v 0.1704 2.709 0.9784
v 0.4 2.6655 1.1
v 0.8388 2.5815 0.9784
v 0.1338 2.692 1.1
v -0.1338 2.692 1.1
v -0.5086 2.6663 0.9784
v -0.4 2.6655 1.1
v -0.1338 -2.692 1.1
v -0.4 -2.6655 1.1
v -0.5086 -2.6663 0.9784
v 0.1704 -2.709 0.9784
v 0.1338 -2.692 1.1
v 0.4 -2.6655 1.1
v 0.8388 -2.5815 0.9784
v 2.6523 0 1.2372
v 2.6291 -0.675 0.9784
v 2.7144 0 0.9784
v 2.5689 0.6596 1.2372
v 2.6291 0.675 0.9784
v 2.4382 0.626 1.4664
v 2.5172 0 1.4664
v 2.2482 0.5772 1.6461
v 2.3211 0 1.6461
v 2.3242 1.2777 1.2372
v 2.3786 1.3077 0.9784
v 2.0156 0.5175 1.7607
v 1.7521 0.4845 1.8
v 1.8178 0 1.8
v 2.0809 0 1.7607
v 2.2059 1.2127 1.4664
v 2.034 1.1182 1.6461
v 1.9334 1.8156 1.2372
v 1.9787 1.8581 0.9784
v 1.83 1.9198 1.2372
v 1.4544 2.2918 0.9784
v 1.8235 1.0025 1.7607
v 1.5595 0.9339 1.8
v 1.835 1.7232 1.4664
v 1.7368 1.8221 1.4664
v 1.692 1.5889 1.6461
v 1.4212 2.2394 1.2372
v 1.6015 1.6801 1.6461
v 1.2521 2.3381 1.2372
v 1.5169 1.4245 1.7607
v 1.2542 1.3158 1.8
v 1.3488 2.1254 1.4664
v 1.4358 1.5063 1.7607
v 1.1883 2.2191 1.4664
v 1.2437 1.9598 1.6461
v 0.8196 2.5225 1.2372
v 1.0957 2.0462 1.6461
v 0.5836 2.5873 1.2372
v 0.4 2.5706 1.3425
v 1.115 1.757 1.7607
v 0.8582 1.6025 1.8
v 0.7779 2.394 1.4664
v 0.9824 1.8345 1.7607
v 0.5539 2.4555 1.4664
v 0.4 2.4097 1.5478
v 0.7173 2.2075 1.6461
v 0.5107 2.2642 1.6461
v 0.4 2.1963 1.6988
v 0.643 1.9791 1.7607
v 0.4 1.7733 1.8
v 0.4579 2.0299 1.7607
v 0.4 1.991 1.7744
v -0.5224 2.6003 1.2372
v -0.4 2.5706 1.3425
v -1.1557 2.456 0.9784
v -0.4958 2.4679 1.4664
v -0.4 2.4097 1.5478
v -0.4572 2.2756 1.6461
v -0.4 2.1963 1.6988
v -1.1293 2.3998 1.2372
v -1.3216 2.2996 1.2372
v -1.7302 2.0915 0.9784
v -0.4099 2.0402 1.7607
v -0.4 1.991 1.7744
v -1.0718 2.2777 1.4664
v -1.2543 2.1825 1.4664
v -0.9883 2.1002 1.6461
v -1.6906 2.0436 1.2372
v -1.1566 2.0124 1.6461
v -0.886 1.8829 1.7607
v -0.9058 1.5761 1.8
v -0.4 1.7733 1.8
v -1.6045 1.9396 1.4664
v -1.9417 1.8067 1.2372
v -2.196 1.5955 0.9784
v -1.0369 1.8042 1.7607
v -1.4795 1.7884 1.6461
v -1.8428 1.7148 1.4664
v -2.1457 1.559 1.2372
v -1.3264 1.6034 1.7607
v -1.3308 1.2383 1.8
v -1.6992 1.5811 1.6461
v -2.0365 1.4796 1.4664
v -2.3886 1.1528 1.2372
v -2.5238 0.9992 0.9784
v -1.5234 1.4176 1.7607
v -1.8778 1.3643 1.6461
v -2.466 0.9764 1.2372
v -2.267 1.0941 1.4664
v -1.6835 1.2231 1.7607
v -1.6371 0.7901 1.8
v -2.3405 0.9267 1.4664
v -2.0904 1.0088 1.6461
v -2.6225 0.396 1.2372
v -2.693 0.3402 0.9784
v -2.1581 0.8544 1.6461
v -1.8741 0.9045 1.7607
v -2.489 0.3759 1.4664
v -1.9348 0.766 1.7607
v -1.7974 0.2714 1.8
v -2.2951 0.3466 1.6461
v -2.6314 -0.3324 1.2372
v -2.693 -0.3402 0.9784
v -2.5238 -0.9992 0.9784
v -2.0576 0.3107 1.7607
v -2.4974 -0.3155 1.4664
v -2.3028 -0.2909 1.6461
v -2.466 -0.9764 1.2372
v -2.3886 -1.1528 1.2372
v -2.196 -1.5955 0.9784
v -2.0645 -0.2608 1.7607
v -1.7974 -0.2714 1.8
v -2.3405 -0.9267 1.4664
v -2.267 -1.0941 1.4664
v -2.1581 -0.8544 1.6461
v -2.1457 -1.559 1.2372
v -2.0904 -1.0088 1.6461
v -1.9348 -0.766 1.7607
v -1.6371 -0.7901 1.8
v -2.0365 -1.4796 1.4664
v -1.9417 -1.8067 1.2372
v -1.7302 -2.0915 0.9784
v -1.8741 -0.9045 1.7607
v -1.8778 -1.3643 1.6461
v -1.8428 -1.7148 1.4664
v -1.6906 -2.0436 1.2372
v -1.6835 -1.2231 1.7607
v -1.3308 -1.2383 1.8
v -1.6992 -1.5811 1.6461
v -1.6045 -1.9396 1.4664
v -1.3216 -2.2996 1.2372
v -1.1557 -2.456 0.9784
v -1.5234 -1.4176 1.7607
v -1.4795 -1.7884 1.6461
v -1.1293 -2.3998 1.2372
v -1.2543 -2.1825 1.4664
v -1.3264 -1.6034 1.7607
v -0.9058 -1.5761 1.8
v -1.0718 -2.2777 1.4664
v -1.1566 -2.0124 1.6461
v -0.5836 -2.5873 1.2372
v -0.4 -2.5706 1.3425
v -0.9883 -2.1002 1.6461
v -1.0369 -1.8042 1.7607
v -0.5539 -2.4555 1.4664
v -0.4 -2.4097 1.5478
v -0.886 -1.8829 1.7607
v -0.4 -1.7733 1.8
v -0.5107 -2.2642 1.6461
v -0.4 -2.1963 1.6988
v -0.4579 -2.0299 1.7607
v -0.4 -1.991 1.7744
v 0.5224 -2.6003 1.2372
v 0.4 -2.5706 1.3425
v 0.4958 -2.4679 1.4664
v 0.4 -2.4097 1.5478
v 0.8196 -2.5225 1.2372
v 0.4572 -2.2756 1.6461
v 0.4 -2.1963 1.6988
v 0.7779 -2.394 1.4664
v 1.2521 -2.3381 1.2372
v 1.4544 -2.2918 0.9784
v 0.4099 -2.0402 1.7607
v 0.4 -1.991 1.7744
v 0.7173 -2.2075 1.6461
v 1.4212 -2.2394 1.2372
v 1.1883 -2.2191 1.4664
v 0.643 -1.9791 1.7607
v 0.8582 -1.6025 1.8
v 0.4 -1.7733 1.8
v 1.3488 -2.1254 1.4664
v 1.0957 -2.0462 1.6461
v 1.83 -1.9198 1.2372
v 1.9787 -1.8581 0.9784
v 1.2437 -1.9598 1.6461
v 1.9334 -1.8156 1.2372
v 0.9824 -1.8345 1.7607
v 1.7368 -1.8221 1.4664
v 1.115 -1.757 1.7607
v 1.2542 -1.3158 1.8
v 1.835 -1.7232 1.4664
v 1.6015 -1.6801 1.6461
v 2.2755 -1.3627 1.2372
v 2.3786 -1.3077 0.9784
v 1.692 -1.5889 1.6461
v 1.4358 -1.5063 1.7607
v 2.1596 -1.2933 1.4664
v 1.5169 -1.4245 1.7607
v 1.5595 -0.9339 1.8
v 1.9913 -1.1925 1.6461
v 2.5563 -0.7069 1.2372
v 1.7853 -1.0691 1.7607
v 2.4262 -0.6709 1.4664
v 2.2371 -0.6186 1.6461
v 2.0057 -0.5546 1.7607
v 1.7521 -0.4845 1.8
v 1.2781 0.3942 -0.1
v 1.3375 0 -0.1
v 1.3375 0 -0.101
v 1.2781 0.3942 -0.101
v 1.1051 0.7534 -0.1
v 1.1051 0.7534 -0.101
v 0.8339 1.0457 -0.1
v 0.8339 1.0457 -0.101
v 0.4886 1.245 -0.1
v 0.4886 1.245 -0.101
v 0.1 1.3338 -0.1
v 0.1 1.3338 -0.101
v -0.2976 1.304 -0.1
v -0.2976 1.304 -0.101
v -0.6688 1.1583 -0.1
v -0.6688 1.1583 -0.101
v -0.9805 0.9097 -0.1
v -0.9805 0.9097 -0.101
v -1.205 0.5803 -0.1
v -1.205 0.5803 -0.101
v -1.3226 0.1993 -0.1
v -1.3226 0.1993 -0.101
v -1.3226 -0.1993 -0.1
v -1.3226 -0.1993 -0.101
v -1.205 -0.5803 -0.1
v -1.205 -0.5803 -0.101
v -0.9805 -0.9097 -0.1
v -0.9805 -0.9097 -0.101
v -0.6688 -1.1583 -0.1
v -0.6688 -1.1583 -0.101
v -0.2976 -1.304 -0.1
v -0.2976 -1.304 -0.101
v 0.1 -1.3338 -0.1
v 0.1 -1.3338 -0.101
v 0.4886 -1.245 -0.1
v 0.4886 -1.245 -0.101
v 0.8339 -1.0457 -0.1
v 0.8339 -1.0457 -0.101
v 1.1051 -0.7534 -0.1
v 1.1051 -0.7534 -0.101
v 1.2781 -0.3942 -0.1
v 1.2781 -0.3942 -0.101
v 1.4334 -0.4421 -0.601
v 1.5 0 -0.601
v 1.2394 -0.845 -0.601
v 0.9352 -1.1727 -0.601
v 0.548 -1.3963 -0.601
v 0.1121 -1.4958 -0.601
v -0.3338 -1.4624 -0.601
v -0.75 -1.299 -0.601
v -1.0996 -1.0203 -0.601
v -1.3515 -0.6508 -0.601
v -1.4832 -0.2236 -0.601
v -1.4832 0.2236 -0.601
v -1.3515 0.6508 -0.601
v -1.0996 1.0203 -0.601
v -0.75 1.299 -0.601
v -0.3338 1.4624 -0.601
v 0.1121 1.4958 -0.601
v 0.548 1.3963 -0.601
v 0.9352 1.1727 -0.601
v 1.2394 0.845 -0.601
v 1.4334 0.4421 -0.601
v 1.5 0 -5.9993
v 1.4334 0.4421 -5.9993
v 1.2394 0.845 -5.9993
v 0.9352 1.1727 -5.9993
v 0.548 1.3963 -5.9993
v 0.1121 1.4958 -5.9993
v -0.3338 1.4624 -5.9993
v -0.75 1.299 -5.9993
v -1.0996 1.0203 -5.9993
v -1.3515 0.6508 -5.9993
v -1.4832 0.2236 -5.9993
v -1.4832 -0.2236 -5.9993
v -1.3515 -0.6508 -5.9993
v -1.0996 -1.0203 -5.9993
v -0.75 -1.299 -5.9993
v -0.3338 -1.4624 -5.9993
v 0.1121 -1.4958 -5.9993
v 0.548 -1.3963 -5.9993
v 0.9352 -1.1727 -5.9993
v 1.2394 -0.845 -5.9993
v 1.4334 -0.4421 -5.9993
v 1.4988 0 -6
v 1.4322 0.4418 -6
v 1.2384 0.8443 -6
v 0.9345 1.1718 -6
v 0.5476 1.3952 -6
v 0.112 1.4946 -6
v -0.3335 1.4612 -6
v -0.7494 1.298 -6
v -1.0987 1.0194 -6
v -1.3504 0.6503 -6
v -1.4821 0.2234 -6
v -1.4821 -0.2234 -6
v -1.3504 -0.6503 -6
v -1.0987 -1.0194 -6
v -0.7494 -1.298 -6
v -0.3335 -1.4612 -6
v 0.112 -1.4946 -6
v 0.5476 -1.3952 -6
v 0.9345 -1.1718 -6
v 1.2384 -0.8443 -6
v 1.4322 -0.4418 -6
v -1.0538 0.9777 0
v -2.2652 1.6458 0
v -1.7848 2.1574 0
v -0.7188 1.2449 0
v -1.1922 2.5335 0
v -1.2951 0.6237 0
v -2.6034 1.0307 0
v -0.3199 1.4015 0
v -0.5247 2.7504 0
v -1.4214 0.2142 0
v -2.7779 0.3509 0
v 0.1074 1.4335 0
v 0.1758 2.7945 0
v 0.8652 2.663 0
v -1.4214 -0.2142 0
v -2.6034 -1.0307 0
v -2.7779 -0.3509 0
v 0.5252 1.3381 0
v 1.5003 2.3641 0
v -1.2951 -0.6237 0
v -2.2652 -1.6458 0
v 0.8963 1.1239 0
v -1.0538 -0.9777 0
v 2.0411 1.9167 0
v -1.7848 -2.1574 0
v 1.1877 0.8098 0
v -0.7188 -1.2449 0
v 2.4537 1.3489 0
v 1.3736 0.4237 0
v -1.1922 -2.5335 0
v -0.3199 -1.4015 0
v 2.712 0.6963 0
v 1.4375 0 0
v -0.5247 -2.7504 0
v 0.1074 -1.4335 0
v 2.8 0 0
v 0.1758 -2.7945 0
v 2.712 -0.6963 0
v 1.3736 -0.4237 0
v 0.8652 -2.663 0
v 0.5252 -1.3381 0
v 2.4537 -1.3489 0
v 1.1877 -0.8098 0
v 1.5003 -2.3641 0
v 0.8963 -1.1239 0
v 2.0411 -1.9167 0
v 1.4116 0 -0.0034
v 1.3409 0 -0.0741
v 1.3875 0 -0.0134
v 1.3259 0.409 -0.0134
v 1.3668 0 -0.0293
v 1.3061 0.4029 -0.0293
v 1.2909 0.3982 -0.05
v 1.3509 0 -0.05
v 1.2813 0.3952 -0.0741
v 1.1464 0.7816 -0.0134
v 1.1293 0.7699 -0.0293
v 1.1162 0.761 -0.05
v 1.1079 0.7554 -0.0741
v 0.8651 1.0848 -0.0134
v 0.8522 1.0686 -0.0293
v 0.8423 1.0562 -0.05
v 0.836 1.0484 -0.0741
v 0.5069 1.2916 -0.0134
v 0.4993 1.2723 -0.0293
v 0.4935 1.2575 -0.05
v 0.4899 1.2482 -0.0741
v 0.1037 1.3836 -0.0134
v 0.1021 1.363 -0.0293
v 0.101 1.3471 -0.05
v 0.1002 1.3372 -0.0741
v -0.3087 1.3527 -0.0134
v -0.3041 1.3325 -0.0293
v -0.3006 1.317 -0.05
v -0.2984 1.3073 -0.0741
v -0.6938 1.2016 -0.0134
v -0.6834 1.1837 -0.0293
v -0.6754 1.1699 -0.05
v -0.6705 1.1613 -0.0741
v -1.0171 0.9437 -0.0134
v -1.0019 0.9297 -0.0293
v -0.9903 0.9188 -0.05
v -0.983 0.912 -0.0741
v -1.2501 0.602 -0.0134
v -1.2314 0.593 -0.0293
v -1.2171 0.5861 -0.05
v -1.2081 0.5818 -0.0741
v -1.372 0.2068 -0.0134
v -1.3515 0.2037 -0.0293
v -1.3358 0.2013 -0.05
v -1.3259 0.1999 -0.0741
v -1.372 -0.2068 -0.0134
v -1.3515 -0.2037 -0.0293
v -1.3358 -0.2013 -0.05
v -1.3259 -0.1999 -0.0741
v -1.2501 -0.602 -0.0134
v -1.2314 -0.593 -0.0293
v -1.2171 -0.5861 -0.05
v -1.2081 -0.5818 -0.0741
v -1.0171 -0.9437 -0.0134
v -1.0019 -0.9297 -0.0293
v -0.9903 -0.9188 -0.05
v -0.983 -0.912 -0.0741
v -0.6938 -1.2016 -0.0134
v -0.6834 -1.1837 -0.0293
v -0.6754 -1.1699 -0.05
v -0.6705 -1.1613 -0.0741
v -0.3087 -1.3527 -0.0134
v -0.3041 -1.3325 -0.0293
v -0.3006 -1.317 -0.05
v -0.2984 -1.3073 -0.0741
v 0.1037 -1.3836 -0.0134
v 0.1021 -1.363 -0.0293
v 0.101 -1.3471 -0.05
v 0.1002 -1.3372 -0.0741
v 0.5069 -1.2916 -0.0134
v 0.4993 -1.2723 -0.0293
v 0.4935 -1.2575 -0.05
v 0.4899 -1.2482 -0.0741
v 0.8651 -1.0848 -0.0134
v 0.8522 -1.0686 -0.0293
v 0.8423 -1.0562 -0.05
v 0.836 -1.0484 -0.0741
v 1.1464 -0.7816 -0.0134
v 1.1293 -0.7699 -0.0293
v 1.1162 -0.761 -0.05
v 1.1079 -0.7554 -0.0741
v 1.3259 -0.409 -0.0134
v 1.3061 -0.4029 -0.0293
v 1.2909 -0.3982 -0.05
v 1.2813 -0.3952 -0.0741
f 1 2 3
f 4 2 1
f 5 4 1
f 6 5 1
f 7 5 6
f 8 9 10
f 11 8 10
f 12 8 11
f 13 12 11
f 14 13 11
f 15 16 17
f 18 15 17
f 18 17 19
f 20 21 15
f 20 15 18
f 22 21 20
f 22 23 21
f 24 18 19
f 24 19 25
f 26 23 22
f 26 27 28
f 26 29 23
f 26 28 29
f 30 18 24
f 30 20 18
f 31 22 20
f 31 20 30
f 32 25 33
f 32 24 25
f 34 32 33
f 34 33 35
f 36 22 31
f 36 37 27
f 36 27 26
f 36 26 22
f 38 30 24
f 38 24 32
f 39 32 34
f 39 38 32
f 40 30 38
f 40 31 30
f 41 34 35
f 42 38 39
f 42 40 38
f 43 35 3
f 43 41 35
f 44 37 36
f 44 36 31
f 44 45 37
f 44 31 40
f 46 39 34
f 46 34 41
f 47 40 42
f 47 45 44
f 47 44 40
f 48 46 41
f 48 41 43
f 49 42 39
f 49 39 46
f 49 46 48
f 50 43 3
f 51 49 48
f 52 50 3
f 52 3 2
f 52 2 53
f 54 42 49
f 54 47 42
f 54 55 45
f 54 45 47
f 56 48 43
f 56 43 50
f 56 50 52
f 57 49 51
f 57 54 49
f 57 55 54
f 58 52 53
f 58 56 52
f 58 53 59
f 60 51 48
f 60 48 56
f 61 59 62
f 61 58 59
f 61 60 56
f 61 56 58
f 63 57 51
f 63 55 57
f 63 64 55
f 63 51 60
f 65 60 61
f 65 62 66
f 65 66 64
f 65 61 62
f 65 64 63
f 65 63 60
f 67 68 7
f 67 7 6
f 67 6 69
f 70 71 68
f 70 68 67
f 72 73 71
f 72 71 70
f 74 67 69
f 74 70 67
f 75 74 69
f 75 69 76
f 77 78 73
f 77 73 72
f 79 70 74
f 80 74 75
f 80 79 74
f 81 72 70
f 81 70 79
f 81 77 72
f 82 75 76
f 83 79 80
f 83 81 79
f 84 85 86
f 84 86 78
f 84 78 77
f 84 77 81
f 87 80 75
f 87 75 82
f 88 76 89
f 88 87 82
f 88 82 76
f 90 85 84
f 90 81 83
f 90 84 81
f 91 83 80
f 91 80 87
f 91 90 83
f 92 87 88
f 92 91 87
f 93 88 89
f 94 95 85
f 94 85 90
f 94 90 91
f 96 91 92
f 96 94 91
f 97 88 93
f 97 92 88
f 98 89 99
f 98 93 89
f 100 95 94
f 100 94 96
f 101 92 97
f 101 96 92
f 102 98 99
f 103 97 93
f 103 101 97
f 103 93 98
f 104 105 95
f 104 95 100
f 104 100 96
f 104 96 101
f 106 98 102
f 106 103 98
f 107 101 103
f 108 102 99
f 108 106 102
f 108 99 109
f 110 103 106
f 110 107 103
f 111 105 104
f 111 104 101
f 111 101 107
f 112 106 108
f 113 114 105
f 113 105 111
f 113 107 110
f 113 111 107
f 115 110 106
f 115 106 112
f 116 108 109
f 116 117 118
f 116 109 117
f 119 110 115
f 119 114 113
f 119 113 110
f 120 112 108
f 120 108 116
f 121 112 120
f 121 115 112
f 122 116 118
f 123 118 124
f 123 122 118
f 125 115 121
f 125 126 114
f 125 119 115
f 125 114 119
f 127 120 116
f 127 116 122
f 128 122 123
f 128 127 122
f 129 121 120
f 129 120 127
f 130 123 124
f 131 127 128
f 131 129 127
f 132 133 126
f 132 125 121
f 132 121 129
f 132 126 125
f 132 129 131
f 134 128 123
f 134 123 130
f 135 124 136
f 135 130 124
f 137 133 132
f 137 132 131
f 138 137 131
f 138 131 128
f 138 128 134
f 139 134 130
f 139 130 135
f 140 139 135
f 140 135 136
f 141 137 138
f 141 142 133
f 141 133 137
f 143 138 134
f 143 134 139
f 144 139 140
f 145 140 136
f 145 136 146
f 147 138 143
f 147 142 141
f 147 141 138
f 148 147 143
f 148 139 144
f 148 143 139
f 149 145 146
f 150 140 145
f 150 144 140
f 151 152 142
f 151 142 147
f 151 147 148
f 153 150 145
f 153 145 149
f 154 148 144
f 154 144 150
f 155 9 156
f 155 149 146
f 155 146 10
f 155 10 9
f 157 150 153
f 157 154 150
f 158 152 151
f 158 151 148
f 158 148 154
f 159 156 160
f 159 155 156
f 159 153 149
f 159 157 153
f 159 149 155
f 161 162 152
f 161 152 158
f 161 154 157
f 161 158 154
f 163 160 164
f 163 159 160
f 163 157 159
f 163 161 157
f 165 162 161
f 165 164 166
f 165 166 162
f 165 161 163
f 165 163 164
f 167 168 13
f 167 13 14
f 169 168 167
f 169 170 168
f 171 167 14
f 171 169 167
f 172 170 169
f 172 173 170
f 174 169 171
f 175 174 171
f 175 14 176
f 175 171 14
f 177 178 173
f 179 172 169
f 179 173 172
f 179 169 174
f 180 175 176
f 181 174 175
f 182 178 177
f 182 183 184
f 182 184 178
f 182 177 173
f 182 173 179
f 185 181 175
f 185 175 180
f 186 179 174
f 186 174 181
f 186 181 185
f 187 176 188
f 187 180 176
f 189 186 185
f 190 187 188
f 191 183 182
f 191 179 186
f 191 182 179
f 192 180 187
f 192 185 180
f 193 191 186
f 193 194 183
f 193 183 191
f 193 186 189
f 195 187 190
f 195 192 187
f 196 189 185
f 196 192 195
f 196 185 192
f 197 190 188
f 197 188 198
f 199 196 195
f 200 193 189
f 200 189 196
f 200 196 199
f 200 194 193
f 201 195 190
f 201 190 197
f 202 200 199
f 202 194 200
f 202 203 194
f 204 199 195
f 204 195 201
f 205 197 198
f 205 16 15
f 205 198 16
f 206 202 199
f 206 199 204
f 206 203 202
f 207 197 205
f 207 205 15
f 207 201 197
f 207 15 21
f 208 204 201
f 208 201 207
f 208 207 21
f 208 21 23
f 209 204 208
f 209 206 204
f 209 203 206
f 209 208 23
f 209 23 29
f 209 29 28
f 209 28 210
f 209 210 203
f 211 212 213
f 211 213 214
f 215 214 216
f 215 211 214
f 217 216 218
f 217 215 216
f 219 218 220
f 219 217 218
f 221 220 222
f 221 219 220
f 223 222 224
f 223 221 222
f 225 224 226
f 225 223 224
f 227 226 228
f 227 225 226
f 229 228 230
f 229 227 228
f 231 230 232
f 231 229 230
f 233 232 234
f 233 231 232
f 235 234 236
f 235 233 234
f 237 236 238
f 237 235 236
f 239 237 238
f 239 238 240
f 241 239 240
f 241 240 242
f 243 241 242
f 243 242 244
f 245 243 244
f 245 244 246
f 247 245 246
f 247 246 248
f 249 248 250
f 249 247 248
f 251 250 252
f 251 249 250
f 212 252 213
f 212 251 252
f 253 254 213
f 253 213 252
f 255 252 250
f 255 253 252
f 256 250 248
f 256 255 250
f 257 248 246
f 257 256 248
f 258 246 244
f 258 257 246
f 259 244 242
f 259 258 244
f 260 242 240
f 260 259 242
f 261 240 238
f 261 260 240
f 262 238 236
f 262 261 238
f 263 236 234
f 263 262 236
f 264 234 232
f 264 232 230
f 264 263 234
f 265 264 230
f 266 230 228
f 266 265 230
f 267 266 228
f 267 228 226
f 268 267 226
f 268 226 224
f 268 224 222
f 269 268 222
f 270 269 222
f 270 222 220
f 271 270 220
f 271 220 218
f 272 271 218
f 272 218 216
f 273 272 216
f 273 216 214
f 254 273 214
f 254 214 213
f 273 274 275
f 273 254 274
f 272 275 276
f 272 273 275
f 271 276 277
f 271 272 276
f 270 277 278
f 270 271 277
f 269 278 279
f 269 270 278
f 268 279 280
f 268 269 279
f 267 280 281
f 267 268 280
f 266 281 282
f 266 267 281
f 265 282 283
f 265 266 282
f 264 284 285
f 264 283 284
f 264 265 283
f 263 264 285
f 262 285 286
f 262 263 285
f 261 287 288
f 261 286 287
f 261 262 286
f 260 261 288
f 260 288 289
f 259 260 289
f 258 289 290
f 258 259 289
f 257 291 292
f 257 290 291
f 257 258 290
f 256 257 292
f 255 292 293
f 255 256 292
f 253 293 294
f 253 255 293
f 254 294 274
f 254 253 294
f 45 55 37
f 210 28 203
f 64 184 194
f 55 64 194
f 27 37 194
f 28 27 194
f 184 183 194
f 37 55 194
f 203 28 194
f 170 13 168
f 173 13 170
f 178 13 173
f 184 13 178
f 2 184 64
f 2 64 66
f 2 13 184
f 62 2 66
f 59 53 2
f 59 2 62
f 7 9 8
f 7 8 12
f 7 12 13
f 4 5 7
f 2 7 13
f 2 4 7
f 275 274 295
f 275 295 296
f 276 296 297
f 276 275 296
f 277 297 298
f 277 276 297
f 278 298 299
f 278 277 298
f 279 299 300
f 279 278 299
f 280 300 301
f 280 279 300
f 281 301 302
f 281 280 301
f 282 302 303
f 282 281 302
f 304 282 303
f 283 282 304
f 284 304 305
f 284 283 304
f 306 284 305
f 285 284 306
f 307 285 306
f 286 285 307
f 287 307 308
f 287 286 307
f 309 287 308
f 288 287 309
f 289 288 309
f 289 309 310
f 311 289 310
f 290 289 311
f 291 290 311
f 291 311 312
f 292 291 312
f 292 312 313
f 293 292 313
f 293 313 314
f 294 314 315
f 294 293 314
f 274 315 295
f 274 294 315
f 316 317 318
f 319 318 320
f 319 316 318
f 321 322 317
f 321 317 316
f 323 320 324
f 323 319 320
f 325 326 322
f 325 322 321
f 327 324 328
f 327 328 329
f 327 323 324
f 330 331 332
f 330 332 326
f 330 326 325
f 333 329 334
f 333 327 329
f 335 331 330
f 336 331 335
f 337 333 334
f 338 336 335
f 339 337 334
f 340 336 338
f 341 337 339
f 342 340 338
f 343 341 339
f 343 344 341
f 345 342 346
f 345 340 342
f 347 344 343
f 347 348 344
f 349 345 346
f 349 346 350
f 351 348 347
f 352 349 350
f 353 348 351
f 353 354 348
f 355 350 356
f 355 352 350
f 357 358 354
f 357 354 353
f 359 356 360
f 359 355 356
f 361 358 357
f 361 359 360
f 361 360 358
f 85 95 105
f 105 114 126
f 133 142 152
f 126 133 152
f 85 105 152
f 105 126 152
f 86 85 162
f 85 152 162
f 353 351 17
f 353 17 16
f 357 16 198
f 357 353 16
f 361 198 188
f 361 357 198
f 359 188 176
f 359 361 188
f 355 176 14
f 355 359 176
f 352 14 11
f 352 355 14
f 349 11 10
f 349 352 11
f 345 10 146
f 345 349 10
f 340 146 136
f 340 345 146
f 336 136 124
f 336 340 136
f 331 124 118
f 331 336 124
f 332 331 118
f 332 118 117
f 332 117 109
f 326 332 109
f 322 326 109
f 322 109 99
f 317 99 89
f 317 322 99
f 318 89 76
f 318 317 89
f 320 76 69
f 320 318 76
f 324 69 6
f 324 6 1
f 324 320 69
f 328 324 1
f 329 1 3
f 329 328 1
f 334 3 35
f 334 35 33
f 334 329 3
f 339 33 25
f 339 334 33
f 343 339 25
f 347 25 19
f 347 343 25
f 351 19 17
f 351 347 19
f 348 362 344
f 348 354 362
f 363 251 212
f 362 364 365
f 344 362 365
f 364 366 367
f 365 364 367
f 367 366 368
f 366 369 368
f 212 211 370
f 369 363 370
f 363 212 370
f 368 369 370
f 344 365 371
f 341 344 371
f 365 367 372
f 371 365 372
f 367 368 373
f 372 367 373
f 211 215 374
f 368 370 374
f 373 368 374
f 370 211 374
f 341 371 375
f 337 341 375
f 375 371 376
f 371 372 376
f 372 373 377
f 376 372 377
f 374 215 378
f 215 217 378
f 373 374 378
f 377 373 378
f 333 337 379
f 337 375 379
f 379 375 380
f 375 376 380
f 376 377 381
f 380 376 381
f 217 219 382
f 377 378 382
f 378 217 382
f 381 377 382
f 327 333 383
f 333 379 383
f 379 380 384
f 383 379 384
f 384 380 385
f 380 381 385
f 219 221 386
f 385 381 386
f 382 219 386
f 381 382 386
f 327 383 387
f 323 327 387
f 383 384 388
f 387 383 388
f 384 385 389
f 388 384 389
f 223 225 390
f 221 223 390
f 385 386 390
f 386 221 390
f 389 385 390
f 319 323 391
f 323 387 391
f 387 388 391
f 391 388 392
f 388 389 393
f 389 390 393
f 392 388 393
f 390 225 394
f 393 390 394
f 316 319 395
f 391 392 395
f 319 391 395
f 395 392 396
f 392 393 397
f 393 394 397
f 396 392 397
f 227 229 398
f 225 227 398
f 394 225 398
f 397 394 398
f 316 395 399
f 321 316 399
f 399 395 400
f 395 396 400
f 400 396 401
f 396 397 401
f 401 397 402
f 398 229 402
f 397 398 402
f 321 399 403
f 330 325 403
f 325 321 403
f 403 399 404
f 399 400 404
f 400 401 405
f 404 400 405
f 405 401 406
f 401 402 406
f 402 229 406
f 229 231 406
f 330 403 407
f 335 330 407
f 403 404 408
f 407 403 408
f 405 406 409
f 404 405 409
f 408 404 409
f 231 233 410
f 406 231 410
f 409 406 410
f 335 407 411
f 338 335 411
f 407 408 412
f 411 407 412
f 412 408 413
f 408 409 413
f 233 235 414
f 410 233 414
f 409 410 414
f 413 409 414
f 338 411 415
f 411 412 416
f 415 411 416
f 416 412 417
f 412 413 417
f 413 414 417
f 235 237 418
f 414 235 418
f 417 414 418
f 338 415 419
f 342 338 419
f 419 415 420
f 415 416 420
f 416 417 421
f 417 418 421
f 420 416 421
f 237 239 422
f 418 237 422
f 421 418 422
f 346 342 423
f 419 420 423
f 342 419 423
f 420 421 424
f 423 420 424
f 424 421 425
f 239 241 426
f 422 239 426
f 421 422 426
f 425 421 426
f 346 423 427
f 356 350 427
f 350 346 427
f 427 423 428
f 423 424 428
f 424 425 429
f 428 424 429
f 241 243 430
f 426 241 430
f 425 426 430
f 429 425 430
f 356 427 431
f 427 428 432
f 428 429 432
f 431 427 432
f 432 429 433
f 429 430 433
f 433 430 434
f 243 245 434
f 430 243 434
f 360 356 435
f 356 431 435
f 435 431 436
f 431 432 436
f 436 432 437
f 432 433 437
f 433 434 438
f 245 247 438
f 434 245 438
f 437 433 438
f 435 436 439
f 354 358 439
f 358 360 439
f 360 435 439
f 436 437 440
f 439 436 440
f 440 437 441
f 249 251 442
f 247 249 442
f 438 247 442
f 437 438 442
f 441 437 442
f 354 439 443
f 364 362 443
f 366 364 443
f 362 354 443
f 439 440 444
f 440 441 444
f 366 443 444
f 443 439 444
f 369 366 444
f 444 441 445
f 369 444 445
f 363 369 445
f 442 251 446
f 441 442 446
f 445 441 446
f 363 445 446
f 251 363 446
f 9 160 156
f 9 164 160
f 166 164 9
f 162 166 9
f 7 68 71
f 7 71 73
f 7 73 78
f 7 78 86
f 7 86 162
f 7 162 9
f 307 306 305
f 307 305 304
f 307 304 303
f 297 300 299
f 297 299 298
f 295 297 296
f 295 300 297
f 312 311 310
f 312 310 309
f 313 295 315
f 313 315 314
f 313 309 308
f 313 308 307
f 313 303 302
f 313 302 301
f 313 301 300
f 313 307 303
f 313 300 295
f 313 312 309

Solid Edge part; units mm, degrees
sketch "Sketch1" plane through (0, 0, 0) normal (0, -1, 0) x (1, 0, 0)
  line L0 (0, -6) -> (1.5, -6)
  line L1 (1.5, -6) -> (1.5, -0.601)
  line L2 (1.5, -0.601) -> (1.3375, -0.101)
  line L3 (1.3375, -0.101) -> (1.3375, 0)
  line L4 (1.3375, 0) -> (2.8, 0)
  line L5 (2.8, 0) -> (2.6425, 1.8)
  line L6 (2.6425, 1.8) -> (0, 1.8)
  dimension "D1" = 1.5
  dimension "D2" = 1.3375
  dimension "D3" = 6
  dimension "D4" = 5.399
  dimension "D5" = 0.5
  dimension "D6" = 2.8
  dimension "D7" = 1.8
revolve "RevolvedProtrusion1" add sketch "Sketch1" angle 360 about axis through (0, 0, 6) along (0, 0, -1)
fillet "Round_1" radius 0.9 1 edges at (-2.6425, 0, 1.8)
sketch "Sketch2" plane through (0, 0, 0) normal (0, -1, 0) x (1, 0, 0)
  line L0 (-0.4, 1.8) -> (-0.4, 1.1)
  line L1 (-0.4, 1.1) -> (0.4, 1.1)
  line L2 (0.4, 1.1) -> (0.4, 1.8)
  line L3 (0.4, 1.8) -> (-0.4, 1.8)
  dimension "D1" = 0.8
  dimension "D2" = 0.7
  dimension "D3" = 1.8
extrude "ExtrudedCutout_1" cut sketch "Sketch2" along normal mid plane 5.6
cosmetic_thread "Thread_1" size "M3" thread depth 5.399
fillet "Round_2" radius 0.1 1 edges at (-1.3375, 0, 0)
chamfer "Chamfer_1" distance 0.0012 angle 30 1 edges at (-1.5, 0, -6) measured on face at (1.03, 0.97, -6)
properties material "Steel"
